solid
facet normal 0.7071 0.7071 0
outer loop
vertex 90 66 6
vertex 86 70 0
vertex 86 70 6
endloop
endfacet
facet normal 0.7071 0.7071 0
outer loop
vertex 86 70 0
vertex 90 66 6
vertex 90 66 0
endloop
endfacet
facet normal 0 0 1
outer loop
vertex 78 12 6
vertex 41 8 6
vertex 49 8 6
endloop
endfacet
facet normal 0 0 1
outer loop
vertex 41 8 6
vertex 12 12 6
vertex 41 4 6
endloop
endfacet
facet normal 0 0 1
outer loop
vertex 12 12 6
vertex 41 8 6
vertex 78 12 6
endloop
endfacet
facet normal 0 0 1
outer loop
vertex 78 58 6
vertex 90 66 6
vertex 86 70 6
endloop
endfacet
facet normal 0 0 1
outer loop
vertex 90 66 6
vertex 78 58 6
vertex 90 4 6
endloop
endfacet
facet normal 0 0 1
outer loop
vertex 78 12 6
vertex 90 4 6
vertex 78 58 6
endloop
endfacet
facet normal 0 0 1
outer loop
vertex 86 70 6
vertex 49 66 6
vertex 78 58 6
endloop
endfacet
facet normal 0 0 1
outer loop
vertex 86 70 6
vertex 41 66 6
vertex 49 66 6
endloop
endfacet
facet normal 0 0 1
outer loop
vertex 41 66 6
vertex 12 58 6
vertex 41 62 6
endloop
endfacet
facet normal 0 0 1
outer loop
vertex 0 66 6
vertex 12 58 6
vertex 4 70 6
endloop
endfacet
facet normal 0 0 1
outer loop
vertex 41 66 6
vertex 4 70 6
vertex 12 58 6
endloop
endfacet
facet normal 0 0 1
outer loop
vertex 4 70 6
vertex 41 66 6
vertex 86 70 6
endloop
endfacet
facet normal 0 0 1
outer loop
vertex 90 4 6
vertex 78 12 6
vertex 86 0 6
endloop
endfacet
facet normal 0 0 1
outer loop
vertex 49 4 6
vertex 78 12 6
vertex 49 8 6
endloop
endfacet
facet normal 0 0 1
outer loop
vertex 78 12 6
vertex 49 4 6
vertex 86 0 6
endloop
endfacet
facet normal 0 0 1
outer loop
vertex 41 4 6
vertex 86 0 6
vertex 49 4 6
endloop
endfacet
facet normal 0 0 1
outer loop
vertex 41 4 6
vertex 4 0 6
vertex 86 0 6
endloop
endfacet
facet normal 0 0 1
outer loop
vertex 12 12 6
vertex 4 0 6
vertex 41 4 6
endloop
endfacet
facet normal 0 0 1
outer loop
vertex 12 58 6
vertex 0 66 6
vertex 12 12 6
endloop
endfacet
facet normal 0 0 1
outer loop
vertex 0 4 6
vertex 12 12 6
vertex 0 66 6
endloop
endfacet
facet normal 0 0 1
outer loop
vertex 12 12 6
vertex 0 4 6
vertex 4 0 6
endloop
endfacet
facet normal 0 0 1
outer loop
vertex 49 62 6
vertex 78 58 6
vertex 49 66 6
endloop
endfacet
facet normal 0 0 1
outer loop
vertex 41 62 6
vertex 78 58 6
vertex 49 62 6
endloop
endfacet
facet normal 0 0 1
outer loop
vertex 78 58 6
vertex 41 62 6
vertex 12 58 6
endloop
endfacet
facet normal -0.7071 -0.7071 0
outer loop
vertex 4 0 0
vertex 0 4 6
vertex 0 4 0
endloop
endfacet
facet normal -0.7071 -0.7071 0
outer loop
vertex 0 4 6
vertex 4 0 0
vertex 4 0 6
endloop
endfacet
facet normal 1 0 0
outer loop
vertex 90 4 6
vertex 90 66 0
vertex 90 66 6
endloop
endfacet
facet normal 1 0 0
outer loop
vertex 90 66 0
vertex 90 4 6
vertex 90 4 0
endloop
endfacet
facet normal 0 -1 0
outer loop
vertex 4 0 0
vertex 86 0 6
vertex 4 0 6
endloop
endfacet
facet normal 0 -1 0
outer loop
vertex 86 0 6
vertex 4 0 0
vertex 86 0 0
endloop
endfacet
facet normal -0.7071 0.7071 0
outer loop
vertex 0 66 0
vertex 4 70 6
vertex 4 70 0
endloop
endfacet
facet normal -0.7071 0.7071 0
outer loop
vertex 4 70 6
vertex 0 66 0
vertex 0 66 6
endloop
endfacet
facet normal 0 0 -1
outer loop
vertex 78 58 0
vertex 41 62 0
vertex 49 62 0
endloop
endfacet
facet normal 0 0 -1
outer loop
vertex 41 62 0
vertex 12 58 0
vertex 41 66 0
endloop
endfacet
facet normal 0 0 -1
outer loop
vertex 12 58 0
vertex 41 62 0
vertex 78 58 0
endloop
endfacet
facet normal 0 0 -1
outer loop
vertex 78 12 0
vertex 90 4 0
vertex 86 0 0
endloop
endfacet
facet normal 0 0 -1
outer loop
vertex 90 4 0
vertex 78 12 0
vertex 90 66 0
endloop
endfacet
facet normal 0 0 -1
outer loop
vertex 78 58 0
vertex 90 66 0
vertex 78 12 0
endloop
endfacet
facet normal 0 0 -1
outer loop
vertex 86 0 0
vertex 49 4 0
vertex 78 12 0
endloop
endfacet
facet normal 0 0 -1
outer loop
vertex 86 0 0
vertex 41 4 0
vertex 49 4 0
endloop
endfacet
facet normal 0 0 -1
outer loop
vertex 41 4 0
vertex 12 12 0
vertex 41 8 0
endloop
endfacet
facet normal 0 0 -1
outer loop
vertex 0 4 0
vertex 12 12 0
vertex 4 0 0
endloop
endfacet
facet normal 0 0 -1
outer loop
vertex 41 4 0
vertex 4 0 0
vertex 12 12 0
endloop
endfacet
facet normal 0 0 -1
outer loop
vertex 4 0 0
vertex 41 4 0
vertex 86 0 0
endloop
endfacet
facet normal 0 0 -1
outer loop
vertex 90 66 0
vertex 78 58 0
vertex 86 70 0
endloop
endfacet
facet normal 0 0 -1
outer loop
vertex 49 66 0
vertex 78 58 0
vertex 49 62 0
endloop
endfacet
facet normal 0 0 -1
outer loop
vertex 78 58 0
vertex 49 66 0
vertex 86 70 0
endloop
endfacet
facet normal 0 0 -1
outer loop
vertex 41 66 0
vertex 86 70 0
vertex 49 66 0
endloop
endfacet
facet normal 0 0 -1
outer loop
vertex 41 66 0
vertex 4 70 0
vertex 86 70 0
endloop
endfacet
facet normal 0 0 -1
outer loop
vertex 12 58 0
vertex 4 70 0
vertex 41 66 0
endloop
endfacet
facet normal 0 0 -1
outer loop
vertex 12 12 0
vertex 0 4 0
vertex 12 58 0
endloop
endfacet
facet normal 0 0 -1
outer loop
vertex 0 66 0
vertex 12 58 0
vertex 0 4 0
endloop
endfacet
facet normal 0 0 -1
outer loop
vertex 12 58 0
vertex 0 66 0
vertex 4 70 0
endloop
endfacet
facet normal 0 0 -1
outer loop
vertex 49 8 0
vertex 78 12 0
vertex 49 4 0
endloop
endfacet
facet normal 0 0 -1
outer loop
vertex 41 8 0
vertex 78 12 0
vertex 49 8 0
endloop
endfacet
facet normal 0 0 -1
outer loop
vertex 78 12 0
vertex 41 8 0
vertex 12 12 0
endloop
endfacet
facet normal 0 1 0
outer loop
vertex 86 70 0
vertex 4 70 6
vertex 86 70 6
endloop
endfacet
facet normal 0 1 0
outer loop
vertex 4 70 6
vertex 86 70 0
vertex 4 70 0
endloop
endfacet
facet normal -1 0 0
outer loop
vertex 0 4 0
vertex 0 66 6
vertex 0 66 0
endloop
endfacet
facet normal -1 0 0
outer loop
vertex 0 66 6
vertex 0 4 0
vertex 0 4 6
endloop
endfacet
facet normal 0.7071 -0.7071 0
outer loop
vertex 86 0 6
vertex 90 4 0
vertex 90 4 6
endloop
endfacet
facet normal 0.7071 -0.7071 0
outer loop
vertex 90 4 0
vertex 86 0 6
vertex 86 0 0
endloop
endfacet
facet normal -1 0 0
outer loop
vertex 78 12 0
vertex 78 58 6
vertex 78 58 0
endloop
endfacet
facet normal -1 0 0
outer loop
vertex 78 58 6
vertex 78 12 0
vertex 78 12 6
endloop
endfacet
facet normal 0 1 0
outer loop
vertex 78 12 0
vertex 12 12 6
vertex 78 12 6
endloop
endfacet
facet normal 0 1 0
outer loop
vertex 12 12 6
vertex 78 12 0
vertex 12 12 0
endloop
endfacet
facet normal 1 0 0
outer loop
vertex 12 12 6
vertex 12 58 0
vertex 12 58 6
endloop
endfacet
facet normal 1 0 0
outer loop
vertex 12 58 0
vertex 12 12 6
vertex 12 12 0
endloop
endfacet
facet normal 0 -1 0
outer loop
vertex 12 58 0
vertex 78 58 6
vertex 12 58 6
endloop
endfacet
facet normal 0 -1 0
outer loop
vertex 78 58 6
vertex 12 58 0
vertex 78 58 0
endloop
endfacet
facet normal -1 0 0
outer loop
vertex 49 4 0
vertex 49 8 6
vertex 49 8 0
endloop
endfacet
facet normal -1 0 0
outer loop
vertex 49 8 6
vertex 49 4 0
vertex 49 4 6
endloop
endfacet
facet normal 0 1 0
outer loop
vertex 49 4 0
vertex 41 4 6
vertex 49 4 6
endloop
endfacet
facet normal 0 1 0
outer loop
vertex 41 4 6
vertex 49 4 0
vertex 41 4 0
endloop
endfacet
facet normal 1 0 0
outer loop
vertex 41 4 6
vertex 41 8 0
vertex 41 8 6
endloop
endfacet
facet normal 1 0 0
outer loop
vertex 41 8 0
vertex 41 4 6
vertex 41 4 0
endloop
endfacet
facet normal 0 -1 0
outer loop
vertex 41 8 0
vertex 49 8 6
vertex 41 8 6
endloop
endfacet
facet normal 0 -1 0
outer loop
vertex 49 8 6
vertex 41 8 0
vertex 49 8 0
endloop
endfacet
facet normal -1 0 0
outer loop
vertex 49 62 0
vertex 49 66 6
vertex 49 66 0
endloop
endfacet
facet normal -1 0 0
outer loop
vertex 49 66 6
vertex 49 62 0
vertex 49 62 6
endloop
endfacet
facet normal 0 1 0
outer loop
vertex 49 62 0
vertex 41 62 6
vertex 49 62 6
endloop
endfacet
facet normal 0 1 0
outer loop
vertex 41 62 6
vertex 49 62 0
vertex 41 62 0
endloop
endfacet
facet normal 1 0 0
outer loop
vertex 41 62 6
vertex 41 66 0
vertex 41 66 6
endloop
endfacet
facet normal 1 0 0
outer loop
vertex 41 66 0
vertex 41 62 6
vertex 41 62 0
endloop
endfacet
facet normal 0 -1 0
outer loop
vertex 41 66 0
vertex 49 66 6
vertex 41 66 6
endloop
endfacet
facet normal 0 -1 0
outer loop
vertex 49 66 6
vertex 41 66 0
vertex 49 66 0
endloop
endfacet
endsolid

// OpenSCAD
$fn = 32;

// ----------------------------------------------------------------------
// Frame plate: 90 x 70 frame, 12 mm rails
// ----------------------------------------------------------------------

// --- parameters (mm) ---
plate_l = 90;             // plate length, X
plate_w = 70;             // plate width, Y
plate_t = 6;              // plate thickness, Z (extrusion height)
corner_c = 4;             // corner chamfer
frame_bar = 12;           // frame rail width
slot_l = 8;               // adjustment slot length
slot_w = 4;               // adjustment slot width

win_l = plate_l - 2 * frame_bar;  // window length
win_w = plate_w - 2 * frame_bar;  // window width

profile = [[4, 0], [86, 0], [90, 4], [90, 66], [86, 70], [4, 70], [0, 66], [0, 4]];  // primary outline, 8 points, counter clockwise
void_1 = [[12, 12], [78, 12], [78, 58], [12, 58]];  // the window, 4 points
void_2 = [[41, 4], [49, 4], [49, 8], [41, 8]];  // adjustment slot, 4 points
void_3 = [[41, 62], [49, 62], [49, 66], [41, 66]];  // adjustment slot, 4 points

// --- the one profile operation ---
difference() {
  linear_extrude(height = plate_t) polygon(points = profile);
  translate([0, 0, -1])
    linear_extrude(height = plate_t + 2) polygon(points = void_1);
  translate([0, 0, -1])
    linear_extrude(height = plate_t + 2) polygon(points = void_2);
  translate([0, 0, -1])
    linear_extrude(height = plate_t + 2) polygon(points = void_3);
}
